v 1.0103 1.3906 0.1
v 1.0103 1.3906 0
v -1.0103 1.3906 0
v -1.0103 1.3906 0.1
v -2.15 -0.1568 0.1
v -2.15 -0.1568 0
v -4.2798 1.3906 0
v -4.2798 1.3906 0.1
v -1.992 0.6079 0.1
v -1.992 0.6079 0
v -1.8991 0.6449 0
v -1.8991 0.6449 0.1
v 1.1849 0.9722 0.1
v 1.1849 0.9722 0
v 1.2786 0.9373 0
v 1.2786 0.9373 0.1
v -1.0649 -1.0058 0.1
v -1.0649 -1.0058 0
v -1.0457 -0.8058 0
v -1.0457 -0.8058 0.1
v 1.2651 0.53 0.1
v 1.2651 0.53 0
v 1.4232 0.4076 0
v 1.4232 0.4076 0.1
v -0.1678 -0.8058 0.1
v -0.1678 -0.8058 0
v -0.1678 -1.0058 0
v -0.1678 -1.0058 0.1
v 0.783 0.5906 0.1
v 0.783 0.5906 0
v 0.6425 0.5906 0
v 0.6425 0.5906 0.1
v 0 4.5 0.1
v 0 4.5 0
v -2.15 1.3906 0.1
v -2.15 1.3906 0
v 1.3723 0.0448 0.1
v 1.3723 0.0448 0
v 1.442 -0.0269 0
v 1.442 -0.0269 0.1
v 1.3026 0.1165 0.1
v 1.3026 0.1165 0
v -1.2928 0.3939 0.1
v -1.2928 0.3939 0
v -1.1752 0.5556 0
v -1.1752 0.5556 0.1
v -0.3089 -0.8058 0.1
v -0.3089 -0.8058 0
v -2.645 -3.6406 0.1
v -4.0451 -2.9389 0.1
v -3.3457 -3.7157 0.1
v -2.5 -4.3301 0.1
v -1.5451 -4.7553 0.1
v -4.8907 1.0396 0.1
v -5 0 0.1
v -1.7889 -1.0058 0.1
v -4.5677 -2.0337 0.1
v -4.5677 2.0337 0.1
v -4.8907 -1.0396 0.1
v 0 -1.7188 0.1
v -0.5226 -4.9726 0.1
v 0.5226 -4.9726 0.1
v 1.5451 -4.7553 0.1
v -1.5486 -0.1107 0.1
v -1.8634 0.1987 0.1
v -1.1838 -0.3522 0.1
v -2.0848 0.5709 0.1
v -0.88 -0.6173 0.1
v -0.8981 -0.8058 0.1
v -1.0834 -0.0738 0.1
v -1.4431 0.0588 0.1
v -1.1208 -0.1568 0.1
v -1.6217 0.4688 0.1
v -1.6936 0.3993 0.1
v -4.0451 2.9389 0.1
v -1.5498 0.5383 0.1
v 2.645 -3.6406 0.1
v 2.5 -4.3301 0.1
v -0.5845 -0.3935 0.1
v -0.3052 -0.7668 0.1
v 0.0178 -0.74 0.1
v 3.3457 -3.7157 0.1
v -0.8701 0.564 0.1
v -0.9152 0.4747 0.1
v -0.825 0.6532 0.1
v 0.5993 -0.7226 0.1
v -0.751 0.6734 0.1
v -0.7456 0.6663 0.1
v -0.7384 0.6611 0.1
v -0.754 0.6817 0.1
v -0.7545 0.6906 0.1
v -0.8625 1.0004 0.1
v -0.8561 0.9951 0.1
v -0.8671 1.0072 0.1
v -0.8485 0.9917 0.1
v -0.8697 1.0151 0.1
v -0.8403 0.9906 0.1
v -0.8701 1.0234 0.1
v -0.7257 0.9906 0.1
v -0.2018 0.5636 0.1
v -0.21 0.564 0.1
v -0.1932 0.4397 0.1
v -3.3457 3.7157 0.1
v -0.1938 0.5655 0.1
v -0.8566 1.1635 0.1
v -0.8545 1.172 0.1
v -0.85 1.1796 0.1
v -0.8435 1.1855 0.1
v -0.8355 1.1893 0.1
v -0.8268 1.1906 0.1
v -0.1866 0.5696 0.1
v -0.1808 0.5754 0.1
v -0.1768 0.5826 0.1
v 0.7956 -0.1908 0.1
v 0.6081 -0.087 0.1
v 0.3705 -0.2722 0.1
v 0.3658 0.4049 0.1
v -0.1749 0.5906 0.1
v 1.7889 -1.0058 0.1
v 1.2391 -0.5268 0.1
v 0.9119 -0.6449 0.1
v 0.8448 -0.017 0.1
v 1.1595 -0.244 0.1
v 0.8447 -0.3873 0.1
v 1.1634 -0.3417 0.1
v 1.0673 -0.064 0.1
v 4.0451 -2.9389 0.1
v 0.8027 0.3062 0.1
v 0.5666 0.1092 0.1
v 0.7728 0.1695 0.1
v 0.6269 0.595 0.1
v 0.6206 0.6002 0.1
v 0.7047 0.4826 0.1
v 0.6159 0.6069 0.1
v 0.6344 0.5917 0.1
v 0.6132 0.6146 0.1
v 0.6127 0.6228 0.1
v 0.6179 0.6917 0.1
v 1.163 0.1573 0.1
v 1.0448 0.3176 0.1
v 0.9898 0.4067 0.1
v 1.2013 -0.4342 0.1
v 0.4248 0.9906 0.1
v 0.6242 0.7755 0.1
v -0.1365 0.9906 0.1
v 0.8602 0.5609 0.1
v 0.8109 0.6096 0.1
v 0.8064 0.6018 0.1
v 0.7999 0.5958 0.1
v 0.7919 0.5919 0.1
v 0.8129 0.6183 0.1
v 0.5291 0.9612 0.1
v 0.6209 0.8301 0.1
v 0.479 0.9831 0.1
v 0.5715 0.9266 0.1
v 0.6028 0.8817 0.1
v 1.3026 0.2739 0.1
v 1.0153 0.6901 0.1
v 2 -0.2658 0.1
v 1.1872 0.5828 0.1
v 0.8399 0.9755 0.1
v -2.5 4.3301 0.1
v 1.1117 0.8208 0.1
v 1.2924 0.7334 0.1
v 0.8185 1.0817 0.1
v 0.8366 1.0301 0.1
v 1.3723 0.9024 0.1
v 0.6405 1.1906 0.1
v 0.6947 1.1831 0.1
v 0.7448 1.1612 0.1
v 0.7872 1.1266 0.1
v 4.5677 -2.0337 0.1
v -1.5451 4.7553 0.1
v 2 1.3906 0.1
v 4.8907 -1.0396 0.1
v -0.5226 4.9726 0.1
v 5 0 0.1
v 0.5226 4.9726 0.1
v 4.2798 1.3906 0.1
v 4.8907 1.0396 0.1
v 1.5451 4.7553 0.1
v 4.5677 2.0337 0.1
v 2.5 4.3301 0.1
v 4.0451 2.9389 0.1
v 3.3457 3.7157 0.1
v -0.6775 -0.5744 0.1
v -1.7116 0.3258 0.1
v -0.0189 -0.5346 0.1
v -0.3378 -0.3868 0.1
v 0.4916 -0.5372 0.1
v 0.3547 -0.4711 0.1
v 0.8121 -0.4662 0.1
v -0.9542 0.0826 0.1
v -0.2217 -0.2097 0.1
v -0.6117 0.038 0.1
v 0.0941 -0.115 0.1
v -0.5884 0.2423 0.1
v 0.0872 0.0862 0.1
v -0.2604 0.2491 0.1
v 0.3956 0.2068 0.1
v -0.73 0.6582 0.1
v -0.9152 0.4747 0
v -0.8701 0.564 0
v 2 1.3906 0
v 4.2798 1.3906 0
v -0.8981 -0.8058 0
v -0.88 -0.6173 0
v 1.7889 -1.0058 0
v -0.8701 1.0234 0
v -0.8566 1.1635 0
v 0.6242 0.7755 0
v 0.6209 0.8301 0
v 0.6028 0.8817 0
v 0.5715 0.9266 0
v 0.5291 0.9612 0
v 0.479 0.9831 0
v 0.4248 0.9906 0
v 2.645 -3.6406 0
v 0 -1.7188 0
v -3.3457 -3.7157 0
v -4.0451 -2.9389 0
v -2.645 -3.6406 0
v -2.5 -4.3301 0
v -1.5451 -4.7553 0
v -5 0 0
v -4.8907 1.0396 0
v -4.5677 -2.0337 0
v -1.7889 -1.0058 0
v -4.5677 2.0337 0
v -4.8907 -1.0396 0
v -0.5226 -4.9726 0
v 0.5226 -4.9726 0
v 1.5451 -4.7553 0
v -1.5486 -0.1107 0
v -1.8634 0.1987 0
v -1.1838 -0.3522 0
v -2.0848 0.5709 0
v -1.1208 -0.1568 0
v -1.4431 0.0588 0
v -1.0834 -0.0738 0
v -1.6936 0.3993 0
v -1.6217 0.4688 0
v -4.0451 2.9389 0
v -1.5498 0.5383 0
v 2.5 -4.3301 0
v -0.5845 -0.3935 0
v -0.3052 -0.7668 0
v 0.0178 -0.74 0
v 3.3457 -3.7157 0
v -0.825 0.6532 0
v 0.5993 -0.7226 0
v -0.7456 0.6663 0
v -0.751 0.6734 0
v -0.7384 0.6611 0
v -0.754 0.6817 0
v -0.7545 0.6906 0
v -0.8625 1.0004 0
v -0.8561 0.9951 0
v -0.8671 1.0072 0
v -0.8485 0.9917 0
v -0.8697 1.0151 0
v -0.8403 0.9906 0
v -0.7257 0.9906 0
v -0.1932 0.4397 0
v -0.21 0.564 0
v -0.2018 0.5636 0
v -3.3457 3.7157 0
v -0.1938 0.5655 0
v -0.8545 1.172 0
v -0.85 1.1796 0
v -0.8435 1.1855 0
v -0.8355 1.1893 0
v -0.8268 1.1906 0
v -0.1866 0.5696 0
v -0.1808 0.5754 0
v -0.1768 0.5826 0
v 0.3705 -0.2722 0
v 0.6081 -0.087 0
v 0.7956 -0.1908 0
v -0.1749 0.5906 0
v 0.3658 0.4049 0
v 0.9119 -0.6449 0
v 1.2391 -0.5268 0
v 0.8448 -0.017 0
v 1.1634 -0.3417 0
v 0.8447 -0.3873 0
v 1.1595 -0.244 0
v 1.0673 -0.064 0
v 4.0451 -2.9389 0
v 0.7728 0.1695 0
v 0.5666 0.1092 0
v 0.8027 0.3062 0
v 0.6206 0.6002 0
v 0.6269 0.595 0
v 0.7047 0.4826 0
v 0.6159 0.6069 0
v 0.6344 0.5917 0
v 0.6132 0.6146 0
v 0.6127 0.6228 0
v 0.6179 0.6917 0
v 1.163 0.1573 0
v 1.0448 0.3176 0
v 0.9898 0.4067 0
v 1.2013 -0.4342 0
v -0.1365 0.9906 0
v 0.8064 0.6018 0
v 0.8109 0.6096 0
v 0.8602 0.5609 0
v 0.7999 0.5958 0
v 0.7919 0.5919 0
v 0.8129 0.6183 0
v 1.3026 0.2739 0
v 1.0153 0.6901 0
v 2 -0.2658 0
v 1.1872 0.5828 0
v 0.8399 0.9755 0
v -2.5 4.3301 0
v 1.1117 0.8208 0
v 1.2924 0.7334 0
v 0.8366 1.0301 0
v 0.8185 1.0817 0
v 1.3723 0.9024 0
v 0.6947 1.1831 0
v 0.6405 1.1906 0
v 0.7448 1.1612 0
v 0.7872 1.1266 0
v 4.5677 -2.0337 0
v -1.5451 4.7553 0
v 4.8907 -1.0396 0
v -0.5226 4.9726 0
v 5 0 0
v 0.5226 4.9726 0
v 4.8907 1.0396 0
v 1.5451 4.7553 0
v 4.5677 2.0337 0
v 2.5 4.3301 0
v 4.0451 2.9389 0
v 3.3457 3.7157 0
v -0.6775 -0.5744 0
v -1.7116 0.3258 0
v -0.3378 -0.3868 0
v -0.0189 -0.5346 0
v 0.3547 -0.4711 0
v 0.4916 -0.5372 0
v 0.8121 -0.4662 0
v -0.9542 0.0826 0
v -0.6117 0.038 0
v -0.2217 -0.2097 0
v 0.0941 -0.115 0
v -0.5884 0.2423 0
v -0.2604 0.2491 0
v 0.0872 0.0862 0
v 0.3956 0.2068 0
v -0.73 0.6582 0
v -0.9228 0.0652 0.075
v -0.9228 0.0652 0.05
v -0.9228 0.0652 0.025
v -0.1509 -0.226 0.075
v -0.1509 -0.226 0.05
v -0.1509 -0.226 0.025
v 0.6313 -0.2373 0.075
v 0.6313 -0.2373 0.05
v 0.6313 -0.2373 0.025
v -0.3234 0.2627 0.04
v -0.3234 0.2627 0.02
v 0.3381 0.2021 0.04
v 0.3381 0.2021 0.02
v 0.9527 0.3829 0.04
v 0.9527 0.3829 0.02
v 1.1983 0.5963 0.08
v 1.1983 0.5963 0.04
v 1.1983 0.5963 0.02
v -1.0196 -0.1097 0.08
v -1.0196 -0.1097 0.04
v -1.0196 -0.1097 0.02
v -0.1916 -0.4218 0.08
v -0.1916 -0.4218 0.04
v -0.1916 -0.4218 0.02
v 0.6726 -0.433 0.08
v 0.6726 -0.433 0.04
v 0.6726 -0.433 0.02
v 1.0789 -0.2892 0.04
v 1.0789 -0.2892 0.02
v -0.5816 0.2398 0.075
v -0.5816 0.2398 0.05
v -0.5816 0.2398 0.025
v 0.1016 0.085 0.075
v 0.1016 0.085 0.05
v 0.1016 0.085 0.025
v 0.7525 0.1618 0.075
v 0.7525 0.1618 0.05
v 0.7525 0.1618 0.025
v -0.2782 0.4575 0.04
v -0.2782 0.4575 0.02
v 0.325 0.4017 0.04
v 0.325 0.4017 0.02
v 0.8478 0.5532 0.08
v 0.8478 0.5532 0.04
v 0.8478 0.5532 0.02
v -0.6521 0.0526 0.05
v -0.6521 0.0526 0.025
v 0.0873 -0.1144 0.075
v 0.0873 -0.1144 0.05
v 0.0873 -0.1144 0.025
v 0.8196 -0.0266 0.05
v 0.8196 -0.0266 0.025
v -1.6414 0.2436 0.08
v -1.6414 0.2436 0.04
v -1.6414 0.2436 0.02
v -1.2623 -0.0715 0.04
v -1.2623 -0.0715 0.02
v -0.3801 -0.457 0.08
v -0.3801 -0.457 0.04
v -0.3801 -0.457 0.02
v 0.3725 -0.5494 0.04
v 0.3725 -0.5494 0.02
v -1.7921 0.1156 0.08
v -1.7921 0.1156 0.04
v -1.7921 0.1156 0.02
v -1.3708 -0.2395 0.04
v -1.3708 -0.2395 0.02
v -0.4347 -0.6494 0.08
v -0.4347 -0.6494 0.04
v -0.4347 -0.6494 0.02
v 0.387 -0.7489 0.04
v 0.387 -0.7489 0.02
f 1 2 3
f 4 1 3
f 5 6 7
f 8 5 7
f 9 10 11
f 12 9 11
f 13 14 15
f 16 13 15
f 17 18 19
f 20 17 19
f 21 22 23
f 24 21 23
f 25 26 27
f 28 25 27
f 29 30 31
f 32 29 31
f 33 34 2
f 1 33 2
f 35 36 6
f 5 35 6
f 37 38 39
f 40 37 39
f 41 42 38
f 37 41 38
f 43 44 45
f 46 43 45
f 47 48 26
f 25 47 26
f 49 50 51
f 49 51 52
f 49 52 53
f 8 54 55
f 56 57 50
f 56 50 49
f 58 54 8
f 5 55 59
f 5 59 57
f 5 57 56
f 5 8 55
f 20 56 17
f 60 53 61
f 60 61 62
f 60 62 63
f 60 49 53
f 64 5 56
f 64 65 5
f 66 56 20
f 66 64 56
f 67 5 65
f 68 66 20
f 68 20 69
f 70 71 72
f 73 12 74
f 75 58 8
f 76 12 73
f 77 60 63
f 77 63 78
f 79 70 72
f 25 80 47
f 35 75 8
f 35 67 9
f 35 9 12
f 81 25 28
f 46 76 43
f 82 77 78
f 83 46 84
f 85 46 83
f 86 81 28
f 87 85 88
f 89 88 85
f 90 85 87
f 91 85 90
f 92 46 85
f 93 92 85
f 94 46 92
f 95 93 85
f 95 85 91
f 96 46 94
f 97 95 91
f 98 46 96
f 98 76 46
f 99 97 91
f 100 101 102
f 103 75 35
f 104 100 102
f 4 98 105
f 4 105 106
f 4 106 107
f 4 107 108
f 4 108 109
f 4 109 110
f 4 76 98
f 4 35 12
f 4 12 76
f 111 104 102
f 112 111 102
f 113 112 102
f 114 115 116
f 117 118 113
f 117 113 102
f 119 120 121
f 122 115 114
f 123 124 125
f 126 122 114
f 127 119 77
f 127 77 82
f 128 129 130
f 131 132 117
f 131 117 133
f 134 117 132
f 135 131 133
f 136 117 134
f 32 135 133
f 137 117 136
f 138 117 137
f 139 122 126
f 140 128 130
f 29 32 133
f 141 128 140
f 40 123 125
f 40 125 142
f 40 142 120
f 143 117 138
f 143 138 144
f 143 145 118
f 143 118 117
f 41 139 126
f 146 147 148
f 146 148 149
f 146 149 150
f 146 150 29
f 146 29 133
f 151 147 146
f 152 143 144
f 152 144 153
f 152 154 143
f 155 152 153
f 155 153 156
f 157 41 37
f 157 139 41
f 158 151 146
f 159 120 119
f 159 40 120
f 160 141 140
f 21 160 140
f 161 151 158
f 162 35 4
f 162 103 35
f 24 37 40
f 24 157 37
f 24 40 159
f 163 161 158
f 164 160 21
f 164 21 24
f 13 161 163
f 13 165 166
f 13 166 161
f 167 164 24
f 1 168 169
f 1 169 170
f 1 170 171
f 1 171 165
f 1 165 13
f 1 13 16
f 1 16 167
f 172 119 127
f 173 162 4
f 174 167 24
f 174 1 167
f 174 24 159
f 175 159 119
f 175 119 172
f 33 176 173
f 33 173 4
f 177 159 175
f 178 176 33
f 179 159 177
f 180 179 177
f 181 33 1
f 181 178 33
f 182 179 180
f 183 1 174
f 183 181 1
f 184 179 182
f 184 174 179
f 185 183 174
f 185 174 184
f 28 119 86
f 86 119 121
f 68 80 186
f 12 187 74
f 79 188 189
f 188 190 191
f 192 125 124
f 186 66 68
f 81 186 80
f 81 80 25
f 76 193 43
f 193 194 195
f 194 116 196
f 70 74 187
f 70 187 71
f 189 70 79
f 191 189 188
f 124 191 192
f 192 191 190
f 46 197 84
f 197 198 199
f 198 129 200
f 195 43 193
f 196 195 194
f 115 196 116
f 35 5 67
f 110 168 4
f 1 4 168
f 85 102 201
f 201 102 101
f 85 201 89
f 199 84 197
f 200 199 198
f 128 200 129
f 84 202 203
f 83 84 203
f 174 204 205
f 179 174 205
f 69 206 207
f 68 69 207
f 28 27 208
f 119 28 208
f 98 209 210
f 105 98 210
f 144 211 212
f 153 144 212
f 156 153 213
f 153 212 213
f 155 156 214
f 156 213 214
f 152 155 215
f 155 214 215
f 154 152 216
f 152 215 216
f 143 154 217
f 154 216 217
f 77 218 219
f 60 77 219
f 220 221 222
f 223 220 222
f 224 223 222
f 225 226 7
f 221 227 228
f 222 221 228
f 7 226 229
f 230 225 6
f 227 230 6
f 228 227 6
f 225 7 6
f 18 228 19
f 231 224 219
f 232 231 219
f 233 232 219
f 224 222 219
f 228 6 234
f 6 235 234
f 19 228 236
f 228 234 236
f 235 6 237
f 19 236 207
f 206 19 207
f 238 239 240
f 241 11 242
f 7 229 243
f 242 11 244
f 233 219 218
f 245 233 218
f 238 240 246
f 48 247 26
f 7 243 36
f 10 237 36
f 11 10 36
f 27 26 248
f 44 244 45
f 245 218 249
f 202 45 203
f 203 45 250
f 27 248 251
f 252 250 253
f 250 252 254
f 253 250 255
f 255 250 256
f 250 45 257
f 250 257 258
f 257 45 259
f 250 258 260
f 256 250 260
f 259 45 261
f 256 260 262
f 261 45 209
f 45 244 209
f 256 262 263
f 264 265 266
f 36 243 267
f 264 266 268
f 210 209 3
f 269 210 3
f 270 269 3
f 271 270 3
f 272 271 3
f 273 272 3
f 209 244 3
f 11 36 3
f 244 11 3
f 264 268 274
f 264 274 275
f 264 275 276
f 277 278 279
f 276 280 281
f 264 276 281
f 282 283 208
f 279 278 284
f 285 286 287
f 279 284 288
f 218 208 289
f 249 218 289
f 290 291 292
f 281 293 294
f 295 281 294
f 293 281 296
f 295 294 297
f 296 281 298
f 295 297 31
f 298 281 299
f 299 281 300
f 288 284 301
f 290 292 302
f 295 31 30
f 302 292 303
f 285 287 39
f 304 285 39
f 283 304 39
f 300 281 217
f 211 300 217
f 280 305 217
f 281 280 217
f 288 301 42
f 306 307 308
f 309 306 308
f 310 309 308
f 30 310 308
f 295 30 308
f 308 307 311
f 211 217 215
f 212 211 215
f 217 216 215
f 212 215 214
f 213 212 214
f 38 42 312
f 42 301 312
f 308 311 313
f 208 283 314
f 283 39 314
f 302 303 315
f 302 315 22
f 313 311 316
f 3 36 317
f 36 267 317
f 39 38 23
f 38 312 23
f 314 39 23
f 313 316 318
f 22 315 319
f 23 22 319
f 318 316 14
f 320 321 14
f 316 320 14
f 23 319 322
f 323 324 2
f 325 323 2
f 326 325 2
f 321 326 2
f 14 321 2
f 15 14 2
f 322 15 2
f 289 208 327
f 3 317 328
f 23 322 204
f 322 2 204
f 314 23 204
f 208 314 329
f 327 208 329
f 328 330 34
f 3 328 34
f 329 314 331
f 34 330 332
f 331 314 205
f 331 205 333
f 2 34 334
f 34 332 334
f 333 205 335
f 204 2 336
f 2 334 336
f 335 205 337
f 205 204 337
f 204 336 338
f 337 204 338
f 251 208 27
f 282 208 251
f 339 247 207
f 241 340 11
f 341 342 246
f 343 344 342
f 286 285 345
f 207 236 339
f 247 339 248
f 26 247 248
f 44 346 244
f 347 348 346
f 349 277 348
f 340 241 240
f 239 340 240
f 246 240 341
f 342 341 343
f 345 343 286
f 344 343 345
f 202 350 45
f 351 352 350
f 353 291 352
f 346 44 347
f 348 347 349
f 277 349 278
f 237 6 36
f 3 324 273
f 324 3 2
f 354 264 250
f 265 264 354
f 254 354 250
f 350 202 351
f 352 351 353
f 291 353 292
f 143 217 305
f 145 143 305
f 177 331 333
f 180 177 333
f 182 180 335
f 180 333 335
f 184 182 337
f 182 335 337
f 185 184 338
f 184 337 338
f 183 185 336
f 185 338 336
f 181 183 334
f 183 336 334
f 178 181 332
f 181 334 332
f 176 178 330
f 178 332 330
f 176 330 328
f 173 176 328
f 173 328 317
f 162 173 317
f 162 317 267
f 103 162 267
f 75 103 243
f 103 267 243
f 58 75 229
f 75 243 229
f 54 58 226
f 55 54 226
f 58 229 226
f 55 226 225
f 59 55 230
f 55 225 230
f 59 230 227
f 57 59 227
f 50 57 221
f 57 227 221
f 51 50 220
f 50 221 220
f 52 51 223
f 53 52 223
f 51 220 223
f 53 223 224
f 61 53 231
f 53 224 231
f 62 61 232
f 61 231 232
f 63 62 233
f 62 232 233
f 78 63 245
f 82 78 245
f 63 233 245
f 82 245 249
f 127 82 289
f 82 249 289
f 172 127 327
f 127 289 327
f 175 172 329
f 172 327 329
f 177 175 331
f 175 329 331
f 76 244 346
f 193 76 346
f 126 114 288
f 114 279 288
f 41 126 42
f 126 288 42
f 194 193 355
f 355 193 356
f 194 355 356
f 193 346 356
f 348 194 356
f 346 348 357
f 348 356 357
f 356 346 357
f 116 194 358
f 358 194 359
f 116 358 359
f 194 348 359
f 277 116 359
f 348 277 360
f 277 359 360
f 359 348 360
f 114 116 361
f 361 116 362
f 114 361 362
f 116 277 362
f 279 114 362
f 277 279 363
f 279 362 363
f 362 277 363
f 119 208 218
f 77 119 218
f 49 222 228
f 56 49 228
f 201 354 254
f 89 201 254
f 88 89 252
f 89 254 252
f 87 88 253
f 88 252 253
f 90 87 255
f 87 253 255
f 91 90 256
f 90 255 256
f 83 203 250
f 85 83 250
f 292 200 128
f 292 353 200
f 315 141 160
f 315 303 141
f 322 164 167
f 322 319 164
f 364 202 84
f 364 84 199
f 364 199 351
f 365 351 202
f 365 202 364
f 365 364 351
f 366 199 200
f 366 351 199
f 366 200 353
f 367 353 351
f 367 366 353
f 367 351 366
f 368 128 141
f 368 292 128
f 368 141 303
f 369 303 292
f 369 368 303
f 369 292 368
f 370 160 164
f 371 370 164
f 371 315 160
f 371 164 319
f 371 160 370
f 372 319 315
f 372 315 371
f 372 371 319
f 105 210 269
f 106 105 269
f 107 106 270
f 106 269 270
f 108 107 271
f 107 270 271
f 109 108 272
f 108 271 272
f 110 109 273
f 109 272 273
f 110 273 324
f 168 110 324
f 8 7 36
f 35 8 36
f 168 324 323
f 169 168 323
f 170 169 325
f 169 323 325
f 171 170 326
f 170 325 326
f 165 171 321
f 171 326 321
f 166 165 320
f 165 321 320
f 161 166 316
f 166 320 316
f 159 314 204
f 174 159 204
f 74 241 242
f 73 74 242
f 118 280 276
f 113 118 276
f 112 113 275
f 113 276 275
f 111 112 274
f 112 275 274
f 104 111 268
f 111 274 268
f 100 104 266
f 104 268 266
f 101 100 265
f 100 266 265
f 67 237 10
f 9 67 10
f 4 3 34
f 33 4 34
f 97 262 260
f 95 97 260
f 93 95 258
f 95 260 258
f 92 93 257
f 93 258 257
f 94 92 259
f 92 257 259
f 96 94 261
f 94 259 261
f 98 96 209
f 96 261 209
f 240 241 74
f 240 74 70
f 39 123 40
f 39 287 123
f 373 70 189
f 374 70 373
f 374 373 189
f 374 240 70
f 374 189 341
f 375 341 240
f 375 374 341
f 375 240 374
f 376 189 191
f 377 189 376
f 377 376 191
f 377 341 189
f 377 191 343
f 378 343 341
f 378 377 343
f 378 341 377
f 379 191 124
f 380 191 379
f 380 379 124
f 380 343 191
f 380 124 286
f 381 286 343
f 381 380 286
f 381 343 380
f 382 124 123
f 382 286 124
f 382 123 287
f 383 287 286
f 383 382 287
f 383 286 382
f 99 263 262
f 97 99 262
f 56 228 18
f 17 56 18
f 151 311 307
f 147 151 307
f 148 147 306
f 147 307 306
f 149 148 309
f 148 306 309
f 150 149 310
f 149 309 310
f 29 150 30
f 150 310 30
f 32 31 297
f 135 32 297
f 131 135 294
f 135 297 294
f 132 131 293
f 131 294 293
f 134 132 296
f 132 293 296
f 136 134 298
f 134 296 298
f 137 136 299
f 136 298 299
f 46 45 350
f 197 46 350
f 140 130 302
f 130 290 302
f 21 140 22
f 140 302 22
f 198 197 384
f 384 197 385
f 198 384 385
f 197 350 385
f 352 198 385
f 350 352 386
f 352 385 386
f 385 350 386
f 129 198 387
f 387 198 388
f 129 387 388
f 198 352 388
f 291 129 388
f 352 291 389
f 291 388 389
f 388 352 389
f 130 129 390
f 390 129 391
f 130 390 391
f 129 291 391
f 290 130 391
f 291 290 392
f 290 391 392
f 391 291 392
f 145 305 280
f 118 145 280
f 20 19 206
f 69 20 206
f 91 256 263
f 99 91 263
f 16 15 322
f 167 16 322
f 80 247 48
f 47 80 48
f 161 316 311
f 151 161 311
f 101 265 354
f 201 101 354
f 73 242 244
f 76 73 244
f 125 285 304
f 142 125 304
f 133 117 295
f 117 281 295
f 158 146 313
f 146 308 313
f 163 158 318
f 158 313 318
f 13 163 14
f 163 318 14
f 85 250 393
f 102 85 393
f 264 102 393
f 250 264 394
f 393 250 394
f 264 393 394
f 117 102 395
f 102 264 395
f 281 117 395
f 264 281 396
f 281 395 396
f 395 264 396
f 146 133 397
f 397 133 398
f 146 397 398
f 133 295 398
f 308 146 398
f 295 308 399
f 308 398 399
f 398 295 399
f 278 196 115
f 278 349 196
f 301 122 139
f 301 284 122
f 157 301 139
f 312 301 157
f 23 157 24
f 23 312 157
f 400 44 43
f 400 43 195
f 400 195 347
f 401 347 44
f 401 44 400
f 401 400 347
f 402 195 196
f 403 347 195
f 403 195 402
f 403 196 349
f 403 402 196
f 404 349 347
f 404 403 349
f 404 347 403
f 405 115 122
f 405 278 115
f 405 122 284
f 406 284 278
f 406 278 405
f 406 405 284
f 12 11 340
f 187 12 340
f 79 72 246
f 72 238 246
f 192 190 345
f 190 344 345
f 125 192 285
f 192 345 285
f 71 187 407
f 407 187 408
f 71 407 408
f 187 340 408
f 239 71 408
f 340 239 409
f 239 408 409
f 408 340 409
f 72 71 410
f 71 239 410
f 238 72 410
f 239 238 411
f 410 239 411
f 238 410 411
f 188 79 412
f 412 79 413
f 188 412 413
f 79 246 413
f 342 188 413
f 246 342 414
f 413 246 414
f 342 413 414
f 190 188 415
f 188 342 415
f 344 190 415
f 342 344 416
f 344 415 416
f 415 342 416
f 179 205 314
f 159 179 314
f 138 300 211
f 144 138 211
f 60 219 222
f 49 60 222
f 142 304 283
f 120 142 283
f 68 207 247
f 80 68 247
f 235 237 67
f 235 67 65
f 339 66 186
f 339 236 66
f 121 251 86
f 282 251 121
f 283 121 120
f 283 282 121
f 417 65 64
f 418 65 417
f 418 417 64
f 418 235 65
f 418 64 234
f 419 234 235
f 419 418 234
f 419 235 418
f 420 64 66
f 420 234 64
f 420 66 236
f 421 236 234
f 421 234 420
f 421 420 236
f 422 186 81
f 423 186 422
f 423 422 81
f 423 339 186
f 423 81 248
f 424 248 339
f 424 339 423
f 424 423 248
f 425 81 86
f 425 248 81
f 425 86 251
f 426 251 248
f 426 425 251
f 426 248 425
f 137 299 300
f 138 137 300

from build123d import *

# Parameters (mm, degrees)
SKETCH_1_R      = 5
EXTRUDE_3_DEPTH = 0.1


with BuildPart() as part:
    # 草图1 → 凸台-拉伸3 (new body)
    with BuildSketch(Plane.XY):
        Circle(SKETCH_1_R)
        Polygon((-0.167777112, -1.005793851), (1.720384349, -1.005793851), (1.788940866, -1.005793851), (2.645033635, -3.640576475), (0, -1.718847051), (-2.645033635, -3.640576475), (-1.788940866, -1.005793851), (-1.196984608, -1.005793851), (-1.064898778, -1.005793851), (-1.045698937, -0.805793851), (-0.898132968, -0.805793851), (-0.880039365, -0.617317259), (-0.305168214, -0.766751199), (-0.308916278, -0.805793851), (-0.167777112, -0.805793851), align=None, mode=Mode.SUBTRACT)
        with BuildLine():
            Line((-1.991956336, 0.60790071), (-1.899072205, 0.644948492))
            add(Edge.make_bspline(
                [(-1.899072205, 0.644948492), (-1.780698643, 0.348168911), (-1.304567249, -0.127672291), (-0.336736042, -0.504525958), (0.252920379, -0.581061249), (0.729572204, -0.501330005), (1.026706033, -0.397504088), (1.163445675, -0.341657163)],
                knots=[0, 0, 0, 0, 0.25, 0.5, 0.75, 0.875, 1, 1, 1, 1], degree=3))
            Line((1.163445675, -0.341657163), (1.201255585, -0.434233676))
            Line((1.201255585, -0.434233676), (1.239065495, -0.526810188))
            add(Edge.make_bspline(
                [(-2.084840467, 0.570852927), (-1.951454553, 0.236435213), (-1.399816024, -0.313391075), (-0.398090532, -0.695067628), (0.253747942, -0.784974301), (0.784004358, -0.694588239), (1.094323827, -0.585925285), (1.239065495, -0.526810188)],
                knots=[0, 0, 0, 0, 0.25, 0.5, 0.75, 0.875, 1, 1, 1, 1], degree=3))
            Line((-2.084840467, 0.570852927), (-1.991956336, 0.60790071))
        make_face(mode=Mode.SUBTRACT)
        Polygon((-4.279754323, 1.390576475), (-2.15, 1.390576475), (-2.15, -0.066596805), (-2.15, -0.156780615), align=None, mode=Mode.SUBTRACT)
        with BuildLine():
            add(Edge.make_bspline(
                [(-1.549830374, 0.538301968), (-1.367834784, 0.350062034), (-0.953039741, 0.039850566), (-0.14913383, -0.273116302), (0.644284758, -0.303181598), (1.121216686, -0.059789278), (1.302628316, 0.116501809)],
                knots=[0, 0, 0, 0, 0.25, 0.5, 0.75, 1, 1, 1, 1], degree=3))
            Line((1.302628316, 0.116501809), (1.372319625, 0.044786249))
            Line((1.372319625, 0.044786249), (1.442010933, -0.026929311))
            add(Edge.make_bspline(
                [(-1.693616475, 0.399285576), (-1.497925898, 0.196880775), (-1.049647981, -0.137319606), (-0.197096293, -0.473093583), (0.540683467, -0.49628987), (1.08406545, -0.311067402), (1.334925603, -0.130992039), (1.442010933, -0.026929311)],
                knots=[0, 0, 0, 0, 0.25, 0.5, 0.75, 0.875, 1, 1, 1, 1], degree=3))
            Line((-1.693616475, 0.399285576), (-1.621723425, 0.468793772))
            Line((-1.621723425, 0.468793772), (-1.549830374, 0.538301968))
        make_face(mode=Mode.SUBTRACT)
        with BuildLine():
            ThreePointArc((-0.840281876, 0.990576475), (-0.862451255, 1.000387117), (-0.870098497, 1.023392545))
            Line((-0.870098497, 1.023392545), (-0.856649718, 1.163485148))
            ThreePointArc((-0.856649718, 1.163485148), (-0.846976154, 1.182792155), (-0.826833098, 1.190576475))
            Line((-0.826833098, 1.190576475), (0.640511551, 1.190576475))
            ThreePointArc((0.640511551, 1.190576475), (0.787174219, 1.126554641), (0.839940758, 0.975477093))
            Line((0.839940758, 0.975477093), (0.812895447, 0.618268761))
            ThreePointArc((0.812895447, 0.618268761), (0.803392481, 0.598564726), (0.783027236, 0.590576475))
            Line((0.783027236, 0.590576475), (0.642533668, 0.590576475))
            ThreePointArc((0.642533668, 0.590576475), (0.620568222, 0.600164928), (0.612665457, 0.622791584))
            Line((0.612665457, 0.622791584), (0.617880458, 0.691670133))
            Line((0.617880458, 0.691670133), (0.624225734, 0.775477093))
            ThreePointArc((0.624225734, 0.775477093), (0.571459194, 0.926554641), (0.424796526, 0.990576475))
            Line((0.424796526, 0.990576475), (0.185889669, 0.990576475))
            Line((0.185889669, 0.990576475), (-0.136466154, 0.990576475))
            Line((-0.136466154, 0.990576475), (-0.174865836, 0.590576475))
            ThreePointArc((-0.174865836, 0.590576475), (-0.186605785, 0.569554584), (-0.210026076, 0.563965642))
            Line((-0.210026076, 0.563965642), (-0.730009604, 0.658240899))
            ThreePointArc((-0.730009604, 0.658240899), (-0.748550248, 0.669637431), (-0.754482606, 0.690576475))
            Line((-0.754482606, 0.690576475), (-0.725682844, 0.990576475))
            Line((-0.725682844, 0.990576475), (-0.840281876, 0.990576475))
        make_face(mode=Mode.SUBTRACT)
        Polygon((-1.010312947, 1.390576475), (0, 4.5), (1.010312947, 1.390576475), align=None, mode=Mode.SUBTRACT)
        with BuildLine():
            Line((-1.233981014, 0.474718903), (-1.175156308, 0.55558703))
            add(Edge.make_bspline(
                [(-1.175156308, 0.55558703), (-0.993921308, 0.423753933), (-0.60253903, 0.216218799), (0.110209984, 0.046440521), (0.771586805, 0.108296918), (1.136324529, 0.363638938), (1.265061247, 0.529994773)],
                knots=[0, 0, 0, 0, 0.25, 0.5, 0.75, 1, 1, 1, 1], degree=3))
            Line((1.265061247, 0.529994773), (1.344146249, 0.468793772))
            Line((1.344146249, 0.468793772), (1.423231251, 0.407592771))
            add(Edge.make_bspline(
                [(-1.29280572, 0.393850776), (-1.097129026, 0.251512571), (-0.673598325, 0.026850492), (0.090771832, -0.155398634), (0.834150505, -0.091874662), (1.271541178, 0.21157621), (1.423231251, 0.407592771)],
                knots=[0, 0, 0, 0, 0.25, 0.5, 0.75, 1, 1, 1, 1], degree=3))
            Line((-1.29280572, 0.393850776), (-1.233981014, 0.474718903))
        make_face(mode=Mode.SUBTRACT)
        with BuildLine():
            add(Edge.make_bspline(
                [(-0.824987307, 0.653212382), (-0.652216888, 0.565882813), (-0.294799178, 0.437574506), (0.340946716, 0.364657013), (0.791001776, 0.488979802), (1.051442622, 0.706562479), (1.151632496, 0.882886074), (1.184898576, 0.972197324)],
                knots=[0, 0, 0, 0, 0.25, 0.5, 0.75, 0.875, 1, 1, 1, 1], degree=3))
            Line((1.184898576, 0.972197324), (1.2786091, 0.937292631))
            Line((1.2786091, 0.937292631), (1.372319625, 0.902387938))
            add(Edge.make_bspline(
                [(-0.915209687, 0.474718903), (-0.728178948, 0.380181227), (-0.341272237, 0.241351144), (0.346598042, 0.160979838), (0.87745692, 0.299632533), (1.209299978, 0.577219377), (1.331357393, 0.792414409), (1.372319625, 0.902387938)],
                knots=[0, 0, 0, 0, 0.25, 0.5, 0.75, 0.875, 1, 1, 1, 1], degree=3))
            Line((-0.915209687, 0.474718903), (-0.870098497, 0.563965642))
            Line((-0.870098497, 0.563965642), (-0.824987307, 0.653212382))
        make_face(mode=Mode.SUBTRACT)
        Polygon((4.279754323, 1.390576475), (2, -0.265761995), (2, -0.022653284), (2, 1.390576475), align=None, mode=Mode.SUBTRACT)
    extrude(amount=EXTRUDE_3_DEPTH)


solid = part.part
